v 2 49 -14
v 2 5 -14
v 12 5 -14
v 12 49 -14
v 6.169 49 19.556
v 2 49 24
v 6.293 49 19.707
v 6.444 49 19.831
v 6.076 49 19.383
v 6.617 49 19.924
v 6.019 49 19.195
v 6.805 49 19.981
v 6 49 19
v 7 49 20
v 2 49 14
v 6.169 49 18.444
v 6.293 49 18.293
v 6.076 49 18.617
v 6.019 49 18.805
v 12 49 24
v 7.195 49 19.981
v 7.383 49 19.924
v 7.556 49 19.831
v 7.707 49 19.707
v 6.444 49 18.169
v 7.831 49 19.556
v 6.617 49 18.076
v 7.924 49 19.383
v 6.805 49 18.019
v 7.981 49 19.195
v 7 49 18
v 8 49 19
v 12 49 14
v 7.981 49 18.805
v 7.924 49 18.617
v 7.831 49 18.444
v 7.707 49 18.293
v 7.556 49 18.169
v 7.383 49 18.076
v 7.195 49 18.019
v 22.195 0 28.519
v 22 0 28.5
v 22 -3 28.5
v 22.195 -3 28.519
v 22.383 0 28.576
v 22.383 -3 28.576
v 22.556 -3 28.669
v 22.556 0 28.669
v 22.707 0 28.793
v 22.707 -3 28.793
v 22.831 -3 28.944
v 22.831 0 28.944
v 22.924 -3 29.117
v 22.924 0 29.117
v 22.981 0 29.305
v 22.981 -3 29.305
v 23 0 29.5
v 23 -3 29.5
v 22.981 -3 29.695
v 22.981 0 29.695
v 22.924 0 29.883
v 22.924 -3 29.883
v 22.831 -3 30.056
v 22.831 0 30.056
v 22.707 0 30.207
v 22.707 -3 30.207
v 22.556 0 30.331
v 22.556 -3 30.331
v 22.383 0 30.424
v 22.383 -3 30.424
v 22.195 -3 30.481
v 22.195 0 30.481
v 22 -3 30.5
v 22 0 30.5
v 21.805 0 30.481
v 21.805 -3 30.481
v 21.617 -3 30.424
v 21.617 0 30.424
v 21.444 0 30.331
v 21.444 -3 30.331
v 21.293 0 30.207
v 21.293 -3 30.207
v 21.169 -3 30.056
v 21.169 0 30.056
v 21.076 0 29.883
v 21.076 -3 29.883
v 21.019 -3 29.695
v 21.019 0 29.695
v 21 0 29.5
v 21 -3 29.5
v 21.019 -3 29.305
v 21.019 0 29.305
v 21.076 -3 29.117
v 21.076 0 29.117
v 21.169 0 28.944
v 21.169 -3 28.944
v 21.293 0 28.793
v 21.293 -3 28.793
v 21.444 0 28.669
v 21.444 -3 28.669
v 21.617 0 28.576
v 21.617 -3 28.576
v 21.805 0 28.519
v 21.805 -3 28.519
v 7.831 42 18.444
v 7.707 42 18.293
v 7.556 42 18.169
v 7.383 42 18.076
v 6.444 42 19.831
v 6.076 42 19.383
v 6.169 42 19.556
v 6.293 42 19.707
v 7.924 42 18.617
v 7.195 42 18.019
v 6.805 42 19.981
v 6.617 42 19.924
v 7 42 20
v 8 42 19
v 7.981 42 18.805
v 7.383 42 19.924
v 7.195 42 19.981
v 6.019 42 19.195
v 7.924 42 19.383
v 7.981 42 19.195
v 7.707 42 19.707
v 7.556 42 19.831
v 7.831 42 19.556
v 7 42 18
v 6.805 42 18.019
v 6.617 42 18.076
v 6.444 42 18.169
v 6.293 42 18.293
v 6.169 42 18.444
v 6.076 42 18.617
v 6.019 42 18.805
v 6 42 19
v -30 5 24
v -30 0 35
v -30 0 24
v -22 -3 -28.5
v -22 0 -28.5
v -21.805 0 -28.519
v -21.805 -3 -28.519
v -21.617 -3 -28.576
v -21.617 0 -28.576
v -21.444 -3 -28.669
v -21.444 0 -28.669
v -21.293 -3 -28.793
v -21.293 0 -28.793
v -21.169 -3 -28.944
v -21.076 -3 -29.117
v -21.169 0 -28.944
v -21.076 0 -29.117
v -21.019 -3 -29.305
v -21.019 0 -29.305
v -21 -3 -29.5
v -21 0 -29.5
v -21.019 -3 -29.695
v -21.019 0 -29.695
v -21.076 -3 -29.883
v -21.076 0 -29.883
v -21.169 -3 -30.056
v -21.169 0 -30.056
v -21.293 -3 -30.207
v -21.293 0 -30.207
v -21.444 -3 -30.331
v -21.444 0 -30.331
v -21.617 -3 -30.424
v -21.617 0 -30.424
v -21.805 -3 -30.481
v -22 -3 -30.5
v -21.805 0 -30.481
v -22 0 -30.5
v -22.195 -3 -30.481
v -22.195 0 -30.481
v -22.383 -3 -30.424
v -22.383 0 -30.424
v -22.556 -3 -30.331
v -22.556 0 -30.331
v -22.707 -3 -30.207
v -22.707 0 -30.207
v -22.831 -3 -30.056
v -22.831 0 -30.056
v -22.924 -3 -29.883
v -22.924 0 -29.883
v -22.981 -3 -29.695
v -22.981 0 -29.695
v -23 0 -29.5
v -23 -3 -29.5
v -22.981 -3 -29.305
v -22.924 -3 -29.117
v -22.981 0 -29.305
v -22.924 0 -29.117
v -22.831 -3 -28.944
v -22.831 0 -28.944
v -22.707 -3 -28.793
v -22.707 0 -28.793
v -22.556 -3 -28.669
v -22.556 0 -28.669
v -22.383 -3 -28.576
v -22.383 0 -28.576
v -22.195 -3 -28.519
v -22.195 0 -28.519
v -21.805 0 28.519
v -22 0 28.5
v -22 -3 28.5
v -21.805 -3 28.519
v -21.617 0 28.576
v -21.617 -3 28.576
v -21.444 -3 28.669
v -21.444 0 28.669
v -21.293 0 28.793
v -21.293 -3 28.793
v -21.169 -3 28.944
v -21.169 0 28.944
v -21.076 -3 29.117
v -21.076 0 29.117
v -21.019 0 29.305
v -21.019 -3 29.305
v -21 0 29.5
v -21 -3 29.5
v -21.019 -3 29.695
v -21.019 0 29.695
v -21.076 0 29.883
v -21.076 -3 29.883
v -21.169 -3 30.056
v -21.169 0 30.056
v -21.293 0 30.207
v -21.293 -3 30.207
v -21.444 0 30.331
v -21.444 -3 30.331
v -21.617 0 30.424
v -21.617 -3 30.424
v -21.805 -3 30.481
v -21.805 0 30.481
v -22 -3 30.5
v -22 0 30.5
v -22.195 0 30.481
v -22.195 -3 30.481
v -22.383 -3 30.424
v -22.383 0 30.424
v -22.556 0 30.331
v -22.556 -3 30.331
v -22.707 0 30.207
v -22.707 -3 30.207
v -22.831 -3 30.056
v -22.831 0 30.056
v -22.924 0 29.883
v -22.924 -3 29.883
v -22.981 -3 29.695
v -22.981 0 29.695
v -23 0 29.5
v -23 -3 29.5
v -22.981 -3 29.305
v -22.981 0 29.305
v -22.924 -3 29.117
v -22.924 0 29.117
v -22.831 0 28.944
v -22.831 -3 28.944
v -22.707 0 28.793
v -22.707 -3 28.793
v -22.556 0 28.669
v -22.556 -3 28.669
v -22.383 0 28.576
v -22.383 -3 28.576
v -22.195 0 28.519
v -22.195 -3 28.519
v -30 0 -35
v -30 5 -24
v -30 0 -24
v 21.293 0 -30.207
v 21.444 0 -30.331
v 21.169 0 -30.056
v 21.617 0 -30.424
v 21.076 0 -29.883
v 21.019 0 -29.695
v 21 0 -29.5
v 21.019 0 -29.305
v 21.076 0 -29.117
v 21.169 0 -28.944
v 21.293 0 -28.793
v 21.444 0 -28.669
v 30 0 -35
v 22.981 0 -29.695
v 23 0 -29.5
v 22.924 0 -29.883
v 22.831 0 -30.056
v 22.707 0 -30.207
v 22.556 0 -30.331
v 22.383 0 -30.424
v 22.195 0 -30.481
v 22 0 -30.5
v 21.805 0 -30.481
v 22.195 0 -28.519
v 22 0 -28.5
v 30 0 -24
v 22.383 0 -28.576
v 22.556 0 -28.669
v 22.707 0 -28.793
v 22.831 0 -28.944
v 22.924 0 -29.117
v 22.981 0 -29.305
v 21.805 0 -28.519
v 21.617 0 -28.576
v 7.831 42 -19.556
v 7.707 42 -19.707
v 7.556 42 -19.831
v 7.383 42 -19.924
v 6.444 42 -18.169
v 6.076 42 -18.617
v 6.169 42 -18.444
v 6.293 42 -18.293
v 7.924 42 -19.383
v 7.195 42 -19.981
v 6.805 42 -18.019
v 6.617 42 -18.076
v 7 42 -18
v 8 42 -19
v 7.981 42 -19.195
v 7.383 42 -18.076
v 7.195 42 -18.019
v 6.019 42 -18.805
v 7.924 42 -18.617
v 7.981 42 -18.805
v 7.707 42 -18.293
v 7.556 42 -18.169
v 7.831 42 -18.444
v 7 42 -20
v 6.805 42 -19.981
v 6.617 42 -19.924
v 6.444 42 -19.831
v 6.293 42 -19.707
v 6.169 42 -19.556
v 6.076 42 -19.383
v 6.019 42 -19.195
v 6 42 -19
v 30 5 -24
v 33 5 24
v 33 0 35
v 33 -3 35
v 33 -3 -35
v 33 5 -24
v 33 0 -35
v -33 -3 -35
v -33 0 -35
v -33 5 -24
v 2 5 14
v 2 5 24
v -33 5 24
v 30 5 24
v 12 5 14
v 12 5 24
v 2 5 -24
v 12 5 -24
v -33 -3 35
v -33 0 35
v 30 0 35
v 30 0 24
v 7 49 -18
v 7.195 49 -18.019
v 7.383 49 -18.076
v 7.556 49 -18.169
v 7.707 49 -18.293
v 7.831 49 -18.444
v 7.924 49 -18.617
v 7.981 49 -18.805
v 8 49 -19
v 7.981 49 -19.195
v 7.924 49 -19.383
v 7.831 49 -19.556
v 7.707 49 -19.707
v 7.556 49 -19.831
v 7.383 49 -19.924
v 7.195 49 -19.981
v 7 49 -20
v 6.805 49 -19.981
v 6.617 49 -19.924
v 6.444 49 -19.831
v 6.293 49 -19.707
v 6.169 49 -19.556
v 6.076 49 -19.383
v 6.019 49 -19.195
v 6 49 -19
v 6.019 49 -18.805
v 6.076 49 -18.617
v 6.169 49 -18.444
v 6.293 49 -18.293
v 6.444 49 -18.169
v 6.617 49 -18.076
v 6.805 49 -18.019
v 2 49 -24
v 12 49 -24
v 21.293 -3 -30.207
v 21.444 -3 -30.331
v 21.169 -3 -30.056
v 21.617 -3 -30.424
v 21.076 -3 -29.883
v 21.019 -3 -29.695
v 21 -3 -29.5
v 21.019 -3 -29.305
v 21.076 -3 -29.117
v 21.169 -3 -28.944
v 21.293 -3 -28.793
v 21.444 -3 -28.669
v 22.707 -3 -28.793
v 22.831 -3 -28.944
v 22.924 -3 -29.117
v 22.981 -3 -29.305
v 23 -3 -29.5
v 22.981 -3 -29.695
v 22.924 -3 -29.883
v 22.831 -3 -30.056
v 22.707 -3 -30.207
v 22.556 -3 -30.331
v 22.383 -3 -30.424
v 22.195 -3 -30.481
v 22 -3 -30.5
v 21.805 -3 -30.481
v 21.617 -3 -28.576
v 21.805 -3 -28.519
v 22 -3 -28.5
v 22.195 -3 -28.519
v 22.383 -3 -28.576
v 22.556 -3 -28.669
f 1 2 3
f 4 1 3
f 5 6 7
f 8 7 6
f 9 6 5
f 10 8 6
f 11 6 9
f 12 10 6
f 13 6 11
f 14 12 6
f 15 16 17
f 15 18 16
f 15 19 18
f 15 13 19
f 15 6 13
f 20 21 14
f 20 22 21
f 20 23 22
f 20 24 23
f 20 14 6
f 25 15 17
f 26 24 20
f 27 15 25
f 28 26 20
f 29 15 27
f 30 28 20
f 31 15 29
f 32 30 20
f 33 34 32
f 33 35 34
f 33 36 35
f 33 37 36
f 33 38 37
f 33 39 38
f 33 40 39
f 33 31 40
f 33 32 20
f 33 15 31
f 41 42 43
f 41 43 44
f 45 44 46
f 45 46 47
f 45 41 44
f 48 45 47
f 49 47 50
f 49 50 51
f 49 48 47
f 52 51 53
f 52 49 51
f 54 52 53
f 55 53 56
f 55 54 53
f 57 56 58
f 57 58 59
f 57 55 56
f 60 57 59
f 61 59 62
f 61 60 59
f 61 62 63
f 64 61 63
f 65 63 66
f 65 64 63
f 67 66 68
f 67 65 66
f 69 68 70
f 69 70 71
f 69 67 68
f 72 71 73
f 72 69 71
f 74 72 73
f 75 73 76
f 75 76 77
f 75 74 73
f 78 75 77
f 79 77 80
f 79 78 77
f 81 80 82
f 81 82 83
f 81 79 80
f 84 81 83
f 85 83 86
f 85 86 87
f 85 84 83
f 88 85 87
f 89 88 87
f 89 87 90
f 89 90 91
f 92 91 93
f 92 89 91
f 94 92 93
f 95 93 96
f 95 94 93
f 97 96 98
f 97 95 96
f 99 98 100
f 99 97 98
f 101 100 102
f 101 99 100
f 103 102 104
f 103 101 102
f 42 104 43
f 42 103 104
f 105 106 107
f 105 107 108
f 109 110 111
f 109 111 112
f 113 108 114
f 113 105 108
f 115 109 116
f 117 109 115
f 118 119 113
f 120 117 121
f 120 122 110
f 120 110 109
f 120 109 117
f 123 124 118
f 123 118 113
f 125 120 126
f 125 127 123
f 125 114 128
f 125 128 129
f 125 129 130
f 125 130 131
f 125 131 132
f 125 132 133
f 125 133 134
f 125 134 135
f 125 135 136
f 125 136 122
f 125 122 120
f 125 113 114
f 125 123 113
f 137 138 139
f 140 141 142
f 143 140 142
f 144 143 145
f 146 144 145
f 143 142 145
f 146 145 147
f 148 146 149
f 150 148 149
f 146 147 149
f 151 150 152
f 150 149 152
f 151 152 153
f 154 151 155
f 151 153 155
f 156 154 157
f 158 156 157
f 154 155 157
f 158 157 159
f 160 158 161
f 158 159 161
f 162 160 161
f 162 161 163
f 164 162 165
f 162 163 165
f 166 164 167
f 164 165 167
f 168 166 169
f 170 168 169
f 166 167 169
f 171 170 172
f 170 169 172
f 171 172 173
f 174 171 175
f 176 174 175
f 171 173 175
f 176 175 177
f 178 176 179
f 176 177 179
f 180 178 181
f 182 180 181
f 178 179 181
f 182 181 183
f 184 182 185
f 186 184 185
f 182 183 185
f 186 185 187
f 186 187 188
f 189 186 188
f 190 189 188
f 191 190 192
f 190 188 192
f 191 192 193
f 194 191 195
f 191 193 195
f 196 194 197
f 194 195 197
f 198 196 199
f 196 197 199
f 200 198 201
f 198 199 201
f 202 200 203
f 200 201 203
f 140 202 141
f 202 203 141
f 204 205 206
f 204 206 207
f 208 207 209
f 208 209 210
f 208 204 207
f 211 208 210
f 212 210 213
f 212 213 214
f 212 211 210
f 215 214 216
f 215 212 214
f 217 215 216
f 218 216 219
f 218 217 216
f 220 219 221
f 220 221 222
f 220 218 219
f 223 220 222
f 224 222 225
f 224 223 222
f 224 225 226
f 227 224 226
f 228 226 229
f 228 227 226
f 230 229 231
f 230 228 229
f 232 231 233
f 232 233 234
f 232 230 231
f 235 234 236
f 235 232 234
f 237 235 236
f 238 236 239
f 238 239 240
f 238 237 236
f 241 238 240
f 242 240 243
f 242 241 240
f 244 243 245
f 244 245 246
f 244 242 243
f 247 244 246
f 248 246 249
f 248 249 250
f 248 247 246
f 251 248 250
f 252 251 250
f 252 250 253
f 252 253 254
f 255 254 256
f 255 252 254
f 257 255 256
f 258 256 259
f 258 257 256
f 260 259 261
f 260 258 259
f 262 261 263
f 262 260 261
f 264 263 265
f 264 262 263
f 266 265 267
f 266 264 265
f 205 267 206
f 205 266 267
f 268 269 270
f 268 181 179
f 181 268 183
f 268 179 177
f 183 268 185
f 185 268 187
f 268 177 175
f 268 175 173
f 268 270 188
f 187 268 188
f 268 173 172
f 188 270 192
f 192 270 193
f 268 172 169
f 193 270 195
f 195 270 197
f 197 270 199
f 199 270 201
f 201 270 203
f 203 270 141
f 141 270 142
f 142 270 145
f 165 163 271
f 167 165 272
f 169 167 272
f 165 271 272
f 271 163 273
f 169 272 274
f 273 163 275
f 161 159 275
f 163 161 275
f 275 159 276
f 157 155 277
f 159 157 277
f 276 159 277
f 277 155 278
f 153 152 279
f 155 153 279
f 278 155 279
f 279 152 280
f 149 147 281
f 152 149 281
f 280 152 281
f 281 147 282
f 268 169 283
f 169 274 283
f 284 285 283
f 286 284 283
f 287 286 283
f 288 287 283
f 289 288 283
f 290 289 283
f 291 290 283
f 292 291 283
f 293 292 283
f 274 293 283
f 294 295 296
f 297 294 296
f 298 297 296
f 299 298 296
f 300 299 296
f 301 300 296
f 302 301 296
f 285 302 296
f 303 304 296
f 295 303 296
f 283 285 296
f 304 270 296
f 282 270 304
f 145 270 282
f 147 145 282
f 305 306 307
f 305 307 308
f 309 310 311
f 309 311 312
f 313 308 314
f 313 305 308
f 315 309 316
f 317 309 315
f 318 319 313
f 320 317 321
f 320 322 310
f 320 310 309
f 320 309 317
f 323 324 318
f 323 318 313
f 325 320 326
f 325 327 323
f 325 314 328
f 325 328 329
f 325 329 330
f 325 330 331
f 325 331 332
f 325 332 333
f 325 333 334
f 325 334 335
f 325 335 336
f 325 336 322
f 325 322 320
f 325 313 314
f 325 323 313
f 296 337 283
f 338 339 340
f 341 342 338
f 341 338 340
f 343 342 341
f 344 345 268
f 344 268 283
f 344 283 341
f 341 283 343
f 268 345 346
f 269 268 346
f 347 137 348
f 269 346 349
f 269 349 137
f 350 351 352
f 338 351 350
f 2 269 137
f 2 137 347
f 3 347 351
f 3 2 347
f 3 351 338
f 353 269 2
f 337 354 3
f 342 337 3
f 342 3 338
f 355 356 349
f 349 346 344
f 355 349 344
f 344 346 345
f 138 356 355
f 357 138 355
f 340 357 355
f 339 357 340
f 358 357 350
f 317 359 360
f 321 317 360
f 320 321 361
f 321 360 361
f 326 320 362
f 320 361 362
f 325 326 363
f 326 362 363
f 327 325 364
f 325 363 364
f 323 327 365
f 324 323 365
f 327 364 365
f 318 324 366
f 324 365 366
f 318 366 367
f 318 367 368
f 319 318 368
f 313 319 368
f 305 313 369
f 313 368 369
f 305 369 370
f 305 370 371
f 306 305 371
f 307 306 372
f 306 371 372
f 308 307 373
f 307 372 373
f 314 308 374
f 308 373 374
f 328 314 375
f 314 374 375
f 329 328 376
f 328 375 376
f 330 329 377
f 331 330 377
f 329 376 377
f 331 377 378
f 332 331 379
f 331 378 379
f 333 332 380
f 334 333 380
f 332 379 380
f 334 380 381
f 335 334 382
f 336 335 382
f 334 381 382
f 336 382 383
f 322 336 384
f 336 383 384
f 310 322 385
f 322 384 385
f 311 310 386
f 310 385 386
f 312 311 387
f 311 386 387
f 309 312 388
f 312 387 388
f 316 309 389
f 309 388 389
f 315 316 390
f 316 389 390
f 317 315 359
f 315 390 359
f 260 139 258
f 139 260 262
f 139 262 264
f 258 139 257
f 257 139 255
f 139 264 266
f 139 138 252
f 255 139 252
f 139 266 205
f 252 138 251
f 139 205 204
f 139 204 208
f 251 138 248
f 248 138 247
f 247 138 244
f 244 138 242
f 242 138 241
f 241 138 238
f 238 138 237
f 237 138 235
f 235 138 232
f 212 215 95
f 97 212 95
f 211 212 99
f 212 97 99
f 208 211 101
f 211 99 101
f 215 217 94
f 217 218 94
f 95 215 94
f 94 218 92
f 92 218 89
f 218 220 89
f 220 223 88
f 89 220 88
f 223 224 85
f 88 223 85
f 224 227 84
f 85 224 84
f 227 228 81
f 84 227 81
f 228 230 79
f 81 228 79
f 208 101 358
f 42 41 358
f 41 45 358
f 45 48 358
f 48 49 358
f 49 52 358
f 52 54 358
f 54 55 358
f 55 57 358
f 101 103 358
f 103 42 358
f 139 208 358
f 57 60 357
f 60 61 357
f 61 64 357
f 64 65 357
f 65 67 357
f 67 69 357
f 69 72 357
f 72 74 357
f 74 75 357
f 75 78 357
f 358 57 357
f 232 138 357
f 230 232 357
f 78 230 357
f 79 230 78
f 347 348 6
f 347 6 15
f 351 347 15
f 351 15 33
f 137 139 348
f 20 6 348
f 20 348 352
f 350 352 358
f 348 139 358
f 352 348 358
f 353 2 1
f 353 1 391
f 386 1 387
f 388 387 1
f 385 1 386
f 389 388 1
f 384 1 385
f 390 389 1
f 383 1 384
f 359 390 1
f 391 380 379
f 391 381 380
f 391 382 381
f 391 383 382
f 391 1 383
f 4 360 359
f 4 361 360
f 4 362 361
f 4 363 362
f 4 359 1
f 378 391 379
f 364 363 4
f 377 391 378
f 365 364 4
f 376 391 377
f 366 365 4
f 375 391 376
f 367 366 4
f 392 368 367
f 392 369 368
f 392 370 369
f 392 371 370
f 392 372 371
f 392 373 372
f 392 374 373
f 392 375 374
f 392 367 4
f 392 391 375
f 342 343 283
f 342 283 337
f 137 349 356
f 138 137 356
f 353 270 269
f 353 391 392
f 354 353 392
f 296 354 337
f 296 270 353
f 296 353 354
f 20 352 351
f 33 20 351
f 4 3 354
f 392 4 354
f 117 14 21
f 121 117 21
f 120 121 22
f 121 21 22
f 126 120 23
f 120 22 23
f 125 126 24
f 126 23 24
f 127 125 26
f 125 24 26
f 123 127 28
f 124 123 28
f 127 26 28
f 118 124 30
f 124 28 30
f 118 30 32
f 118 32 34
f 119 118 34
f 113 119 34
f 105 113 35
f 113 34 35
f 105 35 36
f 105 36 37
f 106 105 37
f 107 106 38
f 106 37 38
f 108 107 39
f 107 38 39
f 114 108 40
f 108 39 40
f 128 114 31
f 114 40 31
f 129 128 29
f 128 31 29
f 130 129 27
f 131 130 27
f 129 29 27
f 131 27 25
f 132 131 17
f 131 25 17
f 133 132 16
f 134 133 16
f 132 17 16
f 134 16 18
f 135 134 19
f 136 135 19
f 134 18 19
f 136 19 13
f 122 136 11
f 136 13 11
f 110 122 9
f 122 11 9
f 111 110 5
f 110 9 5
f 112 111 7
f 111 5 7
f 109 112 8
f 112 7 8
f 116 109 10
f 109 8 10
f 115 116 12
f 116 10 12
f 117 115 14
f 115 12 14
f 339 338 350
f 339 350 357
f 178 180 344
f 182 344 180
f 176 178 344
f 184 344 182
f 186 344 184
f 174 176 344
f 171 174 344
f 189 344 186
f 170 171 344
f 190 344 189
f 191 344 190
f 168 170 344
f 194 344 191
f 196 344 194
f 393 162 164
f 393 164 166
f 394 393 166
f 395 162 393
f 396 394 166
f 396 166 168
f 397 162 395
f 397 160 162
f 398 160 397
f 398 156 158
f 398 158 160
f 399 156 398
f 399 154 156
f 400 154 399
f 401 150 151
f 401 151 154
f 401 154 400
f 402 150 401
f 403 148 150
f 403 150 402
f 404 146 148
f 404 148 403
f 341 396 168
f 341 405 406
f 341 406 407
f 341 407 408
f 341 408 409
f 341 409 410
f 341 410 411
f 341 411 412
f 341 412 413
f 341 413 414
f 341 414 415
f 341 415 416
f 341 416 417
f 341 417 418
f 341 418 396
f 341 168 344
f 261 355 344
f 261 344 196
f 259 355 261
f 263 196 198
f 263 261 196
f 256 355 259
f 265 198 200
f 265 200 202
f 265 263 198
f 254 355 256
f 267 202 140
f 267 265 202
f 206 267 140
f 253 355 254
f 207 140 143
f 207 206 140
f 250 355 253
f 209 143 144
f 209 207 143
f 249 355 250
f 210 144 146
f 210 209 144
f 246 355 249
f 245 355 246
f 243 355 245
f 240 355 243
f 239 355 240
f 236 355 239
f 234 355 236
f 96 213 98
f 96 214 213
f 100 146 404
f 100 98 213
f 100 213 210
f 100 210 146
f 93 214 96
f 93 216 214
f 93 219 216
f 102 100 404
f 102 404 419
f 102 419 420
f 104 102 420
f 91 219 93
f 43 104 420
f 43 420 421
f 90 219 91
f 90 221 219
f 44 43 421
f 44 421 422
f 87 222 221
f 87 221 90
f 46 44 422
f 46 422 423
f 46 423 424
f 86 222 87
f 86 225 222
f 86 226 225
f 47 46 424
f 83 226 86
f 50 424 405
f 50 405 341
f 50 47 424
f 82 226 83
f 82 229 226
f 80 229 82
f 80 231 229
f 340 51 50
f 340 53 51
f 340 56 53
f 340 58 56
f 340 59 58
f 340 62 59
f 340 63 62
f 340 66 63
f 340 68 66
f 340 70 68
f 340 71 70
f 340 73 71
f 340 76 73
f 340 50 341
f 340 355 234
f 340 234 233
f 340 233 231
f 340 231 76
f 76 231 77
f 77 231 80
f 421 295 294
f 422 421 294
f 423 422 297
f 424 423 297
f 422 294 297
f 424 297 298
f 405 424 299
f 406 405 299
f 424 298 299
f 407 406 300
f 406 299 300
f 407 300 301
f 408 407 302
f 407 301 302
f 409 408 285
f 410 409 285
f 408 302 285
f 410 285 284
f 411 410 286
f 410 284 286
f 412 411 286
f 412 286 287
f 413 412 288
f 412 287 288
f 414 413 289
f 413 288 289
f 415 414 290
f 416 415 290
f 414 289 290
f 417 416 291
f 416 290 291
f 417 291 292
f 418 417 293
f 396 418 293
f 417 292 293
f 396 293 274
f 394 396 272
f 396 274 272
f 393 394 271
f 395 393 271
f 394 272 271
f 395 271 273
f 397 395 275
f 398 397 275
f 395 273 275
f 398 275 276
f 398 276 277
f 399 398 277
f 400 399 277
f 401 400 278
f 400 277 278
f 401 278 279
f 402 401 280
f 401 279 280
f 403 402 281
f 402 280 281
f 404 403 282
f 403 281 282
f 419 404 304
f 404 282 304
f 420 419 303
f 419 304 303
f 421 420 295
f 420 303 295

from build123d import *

# Parameters (mm, degrees)
SKETCH1_W           = 66
SKETCH1_H           = 48
BOSS_EXTRUDE1_DEPTH = 5
SKETCH2_W           = 10
SKETCH2_H           = 10
BOSS_EXTRUDE2_DEPTH = 44
SKETCH3_R           = 1
CUT_EXTRUDE1_DEPTH  = 7
SKETCH4_W           = 66
SKETCH4_H           = 70
BOSS_EXTRUDE3_DEPTH = 3
BOSS_EXTRUDE4_DEPTH = 3
SKETCH6_R           = 1
CUT_EXTRUDE2_DEPTH  = 3


with BuildPart() as part:
    # Sketch1 → Boss-Extrude1 (new body)
    with BuildSketch(Plane(origin=(0, 0, 0), x_dir=(1, 0, 0), z_dir=(0, 1, 0))):
        Rectangle(SKETCH1_W, SKETCH1_H)
    extrude(amount=BOSS_EXTRUDE1_DEPTH)

    # Sketch2 → Boss-Extrude2 (add)
    with BuildSketch(Plane(origin=(0, 5, 0), x_dir=(1, 0, 0), z_dir=(0, 1, 0))):
        with Locations((7, 19)):
            Rectangle(SKETCH2_W, SKETCH2_H)
        with Locations((7, -19)):
            Rectangle(SKETCH2_W, SKETCH2_H)
    extrude(amount=BOSS_EXTRUDE2_DEPTH)

    # Sketch3 → Cut-Extrude1 (cut)
    with BuildSketch(Plane(origin=(0, 49, 0), x_dir=(1, 0, 0), z_dir=(0, 1, 0))):
        with Locations(Location((7, 19, 0), (0, 0, 270))):
            Circle(SKETCH3_R)
        with Locations(Location((7, -19, 0), (0, 0, 270))):
            Circle(SKETCH3_R)
    extrude(amount=-CUT_EXTRUDE1_DEPTH, mode=Mode.SUBTRACT)

    # Sketch4 → Boss-Extrude3 (add)
    with BuildSketch(Plane.XZ):
        Rectangle(SKETCH4_W, SKETCH4_H)
    extrude(amount=BOSS_EXTRUDE3_DEPTH)

    # Sketch5 → Boss-Extrude4 (add)
    with BuildSketch(Plane(origin=(33, 0, 0), x_dir=(0, 0, -1), z_dir=(1, 0, 0))):
        Polygon((-24, 5), (-35, 0), (-24, 0), align=None)
        Polygon((24, 5), (24, 0), (35, 0), align=None)
    boss_extrude4 = extrude(amount=-BOSS_EXTRUDE4_DEPTH)

    # Mirror1: Boss-Extrude4 across plane
    add(boss_extrude4.mirror(Plane(origin=(0, 0, 0), x_dir=(0, 0, 1), z_dir=(1, 0, 0))))

    # Sketch6 → Cut-Extrude2 (cut)
    with BuildSketch(Plane(origin=(0, 0, 0), x_dir=(1, 0, 0), z_dir=(0, 1, 0))):
        with Locations(Location((-22, 29.5, 0), (0, 0, 270))):
            Circle(SKETCH6_R)
        with Locations(Location((22, 29.5, 0), (0, 0, 270))):
            Circle(SKETCH6_R)
    cut_extrude2 = extrude(amount=-CUT_EXTRUDE2_DEPTH, mode=Mode.SUBTRACT)

    # Mirror2: Cut-Extrude2 across plane
    add(cut_extrude2.mirror(Plane.XY), mode=Mode.SUBTRACT)


solid = part.part
